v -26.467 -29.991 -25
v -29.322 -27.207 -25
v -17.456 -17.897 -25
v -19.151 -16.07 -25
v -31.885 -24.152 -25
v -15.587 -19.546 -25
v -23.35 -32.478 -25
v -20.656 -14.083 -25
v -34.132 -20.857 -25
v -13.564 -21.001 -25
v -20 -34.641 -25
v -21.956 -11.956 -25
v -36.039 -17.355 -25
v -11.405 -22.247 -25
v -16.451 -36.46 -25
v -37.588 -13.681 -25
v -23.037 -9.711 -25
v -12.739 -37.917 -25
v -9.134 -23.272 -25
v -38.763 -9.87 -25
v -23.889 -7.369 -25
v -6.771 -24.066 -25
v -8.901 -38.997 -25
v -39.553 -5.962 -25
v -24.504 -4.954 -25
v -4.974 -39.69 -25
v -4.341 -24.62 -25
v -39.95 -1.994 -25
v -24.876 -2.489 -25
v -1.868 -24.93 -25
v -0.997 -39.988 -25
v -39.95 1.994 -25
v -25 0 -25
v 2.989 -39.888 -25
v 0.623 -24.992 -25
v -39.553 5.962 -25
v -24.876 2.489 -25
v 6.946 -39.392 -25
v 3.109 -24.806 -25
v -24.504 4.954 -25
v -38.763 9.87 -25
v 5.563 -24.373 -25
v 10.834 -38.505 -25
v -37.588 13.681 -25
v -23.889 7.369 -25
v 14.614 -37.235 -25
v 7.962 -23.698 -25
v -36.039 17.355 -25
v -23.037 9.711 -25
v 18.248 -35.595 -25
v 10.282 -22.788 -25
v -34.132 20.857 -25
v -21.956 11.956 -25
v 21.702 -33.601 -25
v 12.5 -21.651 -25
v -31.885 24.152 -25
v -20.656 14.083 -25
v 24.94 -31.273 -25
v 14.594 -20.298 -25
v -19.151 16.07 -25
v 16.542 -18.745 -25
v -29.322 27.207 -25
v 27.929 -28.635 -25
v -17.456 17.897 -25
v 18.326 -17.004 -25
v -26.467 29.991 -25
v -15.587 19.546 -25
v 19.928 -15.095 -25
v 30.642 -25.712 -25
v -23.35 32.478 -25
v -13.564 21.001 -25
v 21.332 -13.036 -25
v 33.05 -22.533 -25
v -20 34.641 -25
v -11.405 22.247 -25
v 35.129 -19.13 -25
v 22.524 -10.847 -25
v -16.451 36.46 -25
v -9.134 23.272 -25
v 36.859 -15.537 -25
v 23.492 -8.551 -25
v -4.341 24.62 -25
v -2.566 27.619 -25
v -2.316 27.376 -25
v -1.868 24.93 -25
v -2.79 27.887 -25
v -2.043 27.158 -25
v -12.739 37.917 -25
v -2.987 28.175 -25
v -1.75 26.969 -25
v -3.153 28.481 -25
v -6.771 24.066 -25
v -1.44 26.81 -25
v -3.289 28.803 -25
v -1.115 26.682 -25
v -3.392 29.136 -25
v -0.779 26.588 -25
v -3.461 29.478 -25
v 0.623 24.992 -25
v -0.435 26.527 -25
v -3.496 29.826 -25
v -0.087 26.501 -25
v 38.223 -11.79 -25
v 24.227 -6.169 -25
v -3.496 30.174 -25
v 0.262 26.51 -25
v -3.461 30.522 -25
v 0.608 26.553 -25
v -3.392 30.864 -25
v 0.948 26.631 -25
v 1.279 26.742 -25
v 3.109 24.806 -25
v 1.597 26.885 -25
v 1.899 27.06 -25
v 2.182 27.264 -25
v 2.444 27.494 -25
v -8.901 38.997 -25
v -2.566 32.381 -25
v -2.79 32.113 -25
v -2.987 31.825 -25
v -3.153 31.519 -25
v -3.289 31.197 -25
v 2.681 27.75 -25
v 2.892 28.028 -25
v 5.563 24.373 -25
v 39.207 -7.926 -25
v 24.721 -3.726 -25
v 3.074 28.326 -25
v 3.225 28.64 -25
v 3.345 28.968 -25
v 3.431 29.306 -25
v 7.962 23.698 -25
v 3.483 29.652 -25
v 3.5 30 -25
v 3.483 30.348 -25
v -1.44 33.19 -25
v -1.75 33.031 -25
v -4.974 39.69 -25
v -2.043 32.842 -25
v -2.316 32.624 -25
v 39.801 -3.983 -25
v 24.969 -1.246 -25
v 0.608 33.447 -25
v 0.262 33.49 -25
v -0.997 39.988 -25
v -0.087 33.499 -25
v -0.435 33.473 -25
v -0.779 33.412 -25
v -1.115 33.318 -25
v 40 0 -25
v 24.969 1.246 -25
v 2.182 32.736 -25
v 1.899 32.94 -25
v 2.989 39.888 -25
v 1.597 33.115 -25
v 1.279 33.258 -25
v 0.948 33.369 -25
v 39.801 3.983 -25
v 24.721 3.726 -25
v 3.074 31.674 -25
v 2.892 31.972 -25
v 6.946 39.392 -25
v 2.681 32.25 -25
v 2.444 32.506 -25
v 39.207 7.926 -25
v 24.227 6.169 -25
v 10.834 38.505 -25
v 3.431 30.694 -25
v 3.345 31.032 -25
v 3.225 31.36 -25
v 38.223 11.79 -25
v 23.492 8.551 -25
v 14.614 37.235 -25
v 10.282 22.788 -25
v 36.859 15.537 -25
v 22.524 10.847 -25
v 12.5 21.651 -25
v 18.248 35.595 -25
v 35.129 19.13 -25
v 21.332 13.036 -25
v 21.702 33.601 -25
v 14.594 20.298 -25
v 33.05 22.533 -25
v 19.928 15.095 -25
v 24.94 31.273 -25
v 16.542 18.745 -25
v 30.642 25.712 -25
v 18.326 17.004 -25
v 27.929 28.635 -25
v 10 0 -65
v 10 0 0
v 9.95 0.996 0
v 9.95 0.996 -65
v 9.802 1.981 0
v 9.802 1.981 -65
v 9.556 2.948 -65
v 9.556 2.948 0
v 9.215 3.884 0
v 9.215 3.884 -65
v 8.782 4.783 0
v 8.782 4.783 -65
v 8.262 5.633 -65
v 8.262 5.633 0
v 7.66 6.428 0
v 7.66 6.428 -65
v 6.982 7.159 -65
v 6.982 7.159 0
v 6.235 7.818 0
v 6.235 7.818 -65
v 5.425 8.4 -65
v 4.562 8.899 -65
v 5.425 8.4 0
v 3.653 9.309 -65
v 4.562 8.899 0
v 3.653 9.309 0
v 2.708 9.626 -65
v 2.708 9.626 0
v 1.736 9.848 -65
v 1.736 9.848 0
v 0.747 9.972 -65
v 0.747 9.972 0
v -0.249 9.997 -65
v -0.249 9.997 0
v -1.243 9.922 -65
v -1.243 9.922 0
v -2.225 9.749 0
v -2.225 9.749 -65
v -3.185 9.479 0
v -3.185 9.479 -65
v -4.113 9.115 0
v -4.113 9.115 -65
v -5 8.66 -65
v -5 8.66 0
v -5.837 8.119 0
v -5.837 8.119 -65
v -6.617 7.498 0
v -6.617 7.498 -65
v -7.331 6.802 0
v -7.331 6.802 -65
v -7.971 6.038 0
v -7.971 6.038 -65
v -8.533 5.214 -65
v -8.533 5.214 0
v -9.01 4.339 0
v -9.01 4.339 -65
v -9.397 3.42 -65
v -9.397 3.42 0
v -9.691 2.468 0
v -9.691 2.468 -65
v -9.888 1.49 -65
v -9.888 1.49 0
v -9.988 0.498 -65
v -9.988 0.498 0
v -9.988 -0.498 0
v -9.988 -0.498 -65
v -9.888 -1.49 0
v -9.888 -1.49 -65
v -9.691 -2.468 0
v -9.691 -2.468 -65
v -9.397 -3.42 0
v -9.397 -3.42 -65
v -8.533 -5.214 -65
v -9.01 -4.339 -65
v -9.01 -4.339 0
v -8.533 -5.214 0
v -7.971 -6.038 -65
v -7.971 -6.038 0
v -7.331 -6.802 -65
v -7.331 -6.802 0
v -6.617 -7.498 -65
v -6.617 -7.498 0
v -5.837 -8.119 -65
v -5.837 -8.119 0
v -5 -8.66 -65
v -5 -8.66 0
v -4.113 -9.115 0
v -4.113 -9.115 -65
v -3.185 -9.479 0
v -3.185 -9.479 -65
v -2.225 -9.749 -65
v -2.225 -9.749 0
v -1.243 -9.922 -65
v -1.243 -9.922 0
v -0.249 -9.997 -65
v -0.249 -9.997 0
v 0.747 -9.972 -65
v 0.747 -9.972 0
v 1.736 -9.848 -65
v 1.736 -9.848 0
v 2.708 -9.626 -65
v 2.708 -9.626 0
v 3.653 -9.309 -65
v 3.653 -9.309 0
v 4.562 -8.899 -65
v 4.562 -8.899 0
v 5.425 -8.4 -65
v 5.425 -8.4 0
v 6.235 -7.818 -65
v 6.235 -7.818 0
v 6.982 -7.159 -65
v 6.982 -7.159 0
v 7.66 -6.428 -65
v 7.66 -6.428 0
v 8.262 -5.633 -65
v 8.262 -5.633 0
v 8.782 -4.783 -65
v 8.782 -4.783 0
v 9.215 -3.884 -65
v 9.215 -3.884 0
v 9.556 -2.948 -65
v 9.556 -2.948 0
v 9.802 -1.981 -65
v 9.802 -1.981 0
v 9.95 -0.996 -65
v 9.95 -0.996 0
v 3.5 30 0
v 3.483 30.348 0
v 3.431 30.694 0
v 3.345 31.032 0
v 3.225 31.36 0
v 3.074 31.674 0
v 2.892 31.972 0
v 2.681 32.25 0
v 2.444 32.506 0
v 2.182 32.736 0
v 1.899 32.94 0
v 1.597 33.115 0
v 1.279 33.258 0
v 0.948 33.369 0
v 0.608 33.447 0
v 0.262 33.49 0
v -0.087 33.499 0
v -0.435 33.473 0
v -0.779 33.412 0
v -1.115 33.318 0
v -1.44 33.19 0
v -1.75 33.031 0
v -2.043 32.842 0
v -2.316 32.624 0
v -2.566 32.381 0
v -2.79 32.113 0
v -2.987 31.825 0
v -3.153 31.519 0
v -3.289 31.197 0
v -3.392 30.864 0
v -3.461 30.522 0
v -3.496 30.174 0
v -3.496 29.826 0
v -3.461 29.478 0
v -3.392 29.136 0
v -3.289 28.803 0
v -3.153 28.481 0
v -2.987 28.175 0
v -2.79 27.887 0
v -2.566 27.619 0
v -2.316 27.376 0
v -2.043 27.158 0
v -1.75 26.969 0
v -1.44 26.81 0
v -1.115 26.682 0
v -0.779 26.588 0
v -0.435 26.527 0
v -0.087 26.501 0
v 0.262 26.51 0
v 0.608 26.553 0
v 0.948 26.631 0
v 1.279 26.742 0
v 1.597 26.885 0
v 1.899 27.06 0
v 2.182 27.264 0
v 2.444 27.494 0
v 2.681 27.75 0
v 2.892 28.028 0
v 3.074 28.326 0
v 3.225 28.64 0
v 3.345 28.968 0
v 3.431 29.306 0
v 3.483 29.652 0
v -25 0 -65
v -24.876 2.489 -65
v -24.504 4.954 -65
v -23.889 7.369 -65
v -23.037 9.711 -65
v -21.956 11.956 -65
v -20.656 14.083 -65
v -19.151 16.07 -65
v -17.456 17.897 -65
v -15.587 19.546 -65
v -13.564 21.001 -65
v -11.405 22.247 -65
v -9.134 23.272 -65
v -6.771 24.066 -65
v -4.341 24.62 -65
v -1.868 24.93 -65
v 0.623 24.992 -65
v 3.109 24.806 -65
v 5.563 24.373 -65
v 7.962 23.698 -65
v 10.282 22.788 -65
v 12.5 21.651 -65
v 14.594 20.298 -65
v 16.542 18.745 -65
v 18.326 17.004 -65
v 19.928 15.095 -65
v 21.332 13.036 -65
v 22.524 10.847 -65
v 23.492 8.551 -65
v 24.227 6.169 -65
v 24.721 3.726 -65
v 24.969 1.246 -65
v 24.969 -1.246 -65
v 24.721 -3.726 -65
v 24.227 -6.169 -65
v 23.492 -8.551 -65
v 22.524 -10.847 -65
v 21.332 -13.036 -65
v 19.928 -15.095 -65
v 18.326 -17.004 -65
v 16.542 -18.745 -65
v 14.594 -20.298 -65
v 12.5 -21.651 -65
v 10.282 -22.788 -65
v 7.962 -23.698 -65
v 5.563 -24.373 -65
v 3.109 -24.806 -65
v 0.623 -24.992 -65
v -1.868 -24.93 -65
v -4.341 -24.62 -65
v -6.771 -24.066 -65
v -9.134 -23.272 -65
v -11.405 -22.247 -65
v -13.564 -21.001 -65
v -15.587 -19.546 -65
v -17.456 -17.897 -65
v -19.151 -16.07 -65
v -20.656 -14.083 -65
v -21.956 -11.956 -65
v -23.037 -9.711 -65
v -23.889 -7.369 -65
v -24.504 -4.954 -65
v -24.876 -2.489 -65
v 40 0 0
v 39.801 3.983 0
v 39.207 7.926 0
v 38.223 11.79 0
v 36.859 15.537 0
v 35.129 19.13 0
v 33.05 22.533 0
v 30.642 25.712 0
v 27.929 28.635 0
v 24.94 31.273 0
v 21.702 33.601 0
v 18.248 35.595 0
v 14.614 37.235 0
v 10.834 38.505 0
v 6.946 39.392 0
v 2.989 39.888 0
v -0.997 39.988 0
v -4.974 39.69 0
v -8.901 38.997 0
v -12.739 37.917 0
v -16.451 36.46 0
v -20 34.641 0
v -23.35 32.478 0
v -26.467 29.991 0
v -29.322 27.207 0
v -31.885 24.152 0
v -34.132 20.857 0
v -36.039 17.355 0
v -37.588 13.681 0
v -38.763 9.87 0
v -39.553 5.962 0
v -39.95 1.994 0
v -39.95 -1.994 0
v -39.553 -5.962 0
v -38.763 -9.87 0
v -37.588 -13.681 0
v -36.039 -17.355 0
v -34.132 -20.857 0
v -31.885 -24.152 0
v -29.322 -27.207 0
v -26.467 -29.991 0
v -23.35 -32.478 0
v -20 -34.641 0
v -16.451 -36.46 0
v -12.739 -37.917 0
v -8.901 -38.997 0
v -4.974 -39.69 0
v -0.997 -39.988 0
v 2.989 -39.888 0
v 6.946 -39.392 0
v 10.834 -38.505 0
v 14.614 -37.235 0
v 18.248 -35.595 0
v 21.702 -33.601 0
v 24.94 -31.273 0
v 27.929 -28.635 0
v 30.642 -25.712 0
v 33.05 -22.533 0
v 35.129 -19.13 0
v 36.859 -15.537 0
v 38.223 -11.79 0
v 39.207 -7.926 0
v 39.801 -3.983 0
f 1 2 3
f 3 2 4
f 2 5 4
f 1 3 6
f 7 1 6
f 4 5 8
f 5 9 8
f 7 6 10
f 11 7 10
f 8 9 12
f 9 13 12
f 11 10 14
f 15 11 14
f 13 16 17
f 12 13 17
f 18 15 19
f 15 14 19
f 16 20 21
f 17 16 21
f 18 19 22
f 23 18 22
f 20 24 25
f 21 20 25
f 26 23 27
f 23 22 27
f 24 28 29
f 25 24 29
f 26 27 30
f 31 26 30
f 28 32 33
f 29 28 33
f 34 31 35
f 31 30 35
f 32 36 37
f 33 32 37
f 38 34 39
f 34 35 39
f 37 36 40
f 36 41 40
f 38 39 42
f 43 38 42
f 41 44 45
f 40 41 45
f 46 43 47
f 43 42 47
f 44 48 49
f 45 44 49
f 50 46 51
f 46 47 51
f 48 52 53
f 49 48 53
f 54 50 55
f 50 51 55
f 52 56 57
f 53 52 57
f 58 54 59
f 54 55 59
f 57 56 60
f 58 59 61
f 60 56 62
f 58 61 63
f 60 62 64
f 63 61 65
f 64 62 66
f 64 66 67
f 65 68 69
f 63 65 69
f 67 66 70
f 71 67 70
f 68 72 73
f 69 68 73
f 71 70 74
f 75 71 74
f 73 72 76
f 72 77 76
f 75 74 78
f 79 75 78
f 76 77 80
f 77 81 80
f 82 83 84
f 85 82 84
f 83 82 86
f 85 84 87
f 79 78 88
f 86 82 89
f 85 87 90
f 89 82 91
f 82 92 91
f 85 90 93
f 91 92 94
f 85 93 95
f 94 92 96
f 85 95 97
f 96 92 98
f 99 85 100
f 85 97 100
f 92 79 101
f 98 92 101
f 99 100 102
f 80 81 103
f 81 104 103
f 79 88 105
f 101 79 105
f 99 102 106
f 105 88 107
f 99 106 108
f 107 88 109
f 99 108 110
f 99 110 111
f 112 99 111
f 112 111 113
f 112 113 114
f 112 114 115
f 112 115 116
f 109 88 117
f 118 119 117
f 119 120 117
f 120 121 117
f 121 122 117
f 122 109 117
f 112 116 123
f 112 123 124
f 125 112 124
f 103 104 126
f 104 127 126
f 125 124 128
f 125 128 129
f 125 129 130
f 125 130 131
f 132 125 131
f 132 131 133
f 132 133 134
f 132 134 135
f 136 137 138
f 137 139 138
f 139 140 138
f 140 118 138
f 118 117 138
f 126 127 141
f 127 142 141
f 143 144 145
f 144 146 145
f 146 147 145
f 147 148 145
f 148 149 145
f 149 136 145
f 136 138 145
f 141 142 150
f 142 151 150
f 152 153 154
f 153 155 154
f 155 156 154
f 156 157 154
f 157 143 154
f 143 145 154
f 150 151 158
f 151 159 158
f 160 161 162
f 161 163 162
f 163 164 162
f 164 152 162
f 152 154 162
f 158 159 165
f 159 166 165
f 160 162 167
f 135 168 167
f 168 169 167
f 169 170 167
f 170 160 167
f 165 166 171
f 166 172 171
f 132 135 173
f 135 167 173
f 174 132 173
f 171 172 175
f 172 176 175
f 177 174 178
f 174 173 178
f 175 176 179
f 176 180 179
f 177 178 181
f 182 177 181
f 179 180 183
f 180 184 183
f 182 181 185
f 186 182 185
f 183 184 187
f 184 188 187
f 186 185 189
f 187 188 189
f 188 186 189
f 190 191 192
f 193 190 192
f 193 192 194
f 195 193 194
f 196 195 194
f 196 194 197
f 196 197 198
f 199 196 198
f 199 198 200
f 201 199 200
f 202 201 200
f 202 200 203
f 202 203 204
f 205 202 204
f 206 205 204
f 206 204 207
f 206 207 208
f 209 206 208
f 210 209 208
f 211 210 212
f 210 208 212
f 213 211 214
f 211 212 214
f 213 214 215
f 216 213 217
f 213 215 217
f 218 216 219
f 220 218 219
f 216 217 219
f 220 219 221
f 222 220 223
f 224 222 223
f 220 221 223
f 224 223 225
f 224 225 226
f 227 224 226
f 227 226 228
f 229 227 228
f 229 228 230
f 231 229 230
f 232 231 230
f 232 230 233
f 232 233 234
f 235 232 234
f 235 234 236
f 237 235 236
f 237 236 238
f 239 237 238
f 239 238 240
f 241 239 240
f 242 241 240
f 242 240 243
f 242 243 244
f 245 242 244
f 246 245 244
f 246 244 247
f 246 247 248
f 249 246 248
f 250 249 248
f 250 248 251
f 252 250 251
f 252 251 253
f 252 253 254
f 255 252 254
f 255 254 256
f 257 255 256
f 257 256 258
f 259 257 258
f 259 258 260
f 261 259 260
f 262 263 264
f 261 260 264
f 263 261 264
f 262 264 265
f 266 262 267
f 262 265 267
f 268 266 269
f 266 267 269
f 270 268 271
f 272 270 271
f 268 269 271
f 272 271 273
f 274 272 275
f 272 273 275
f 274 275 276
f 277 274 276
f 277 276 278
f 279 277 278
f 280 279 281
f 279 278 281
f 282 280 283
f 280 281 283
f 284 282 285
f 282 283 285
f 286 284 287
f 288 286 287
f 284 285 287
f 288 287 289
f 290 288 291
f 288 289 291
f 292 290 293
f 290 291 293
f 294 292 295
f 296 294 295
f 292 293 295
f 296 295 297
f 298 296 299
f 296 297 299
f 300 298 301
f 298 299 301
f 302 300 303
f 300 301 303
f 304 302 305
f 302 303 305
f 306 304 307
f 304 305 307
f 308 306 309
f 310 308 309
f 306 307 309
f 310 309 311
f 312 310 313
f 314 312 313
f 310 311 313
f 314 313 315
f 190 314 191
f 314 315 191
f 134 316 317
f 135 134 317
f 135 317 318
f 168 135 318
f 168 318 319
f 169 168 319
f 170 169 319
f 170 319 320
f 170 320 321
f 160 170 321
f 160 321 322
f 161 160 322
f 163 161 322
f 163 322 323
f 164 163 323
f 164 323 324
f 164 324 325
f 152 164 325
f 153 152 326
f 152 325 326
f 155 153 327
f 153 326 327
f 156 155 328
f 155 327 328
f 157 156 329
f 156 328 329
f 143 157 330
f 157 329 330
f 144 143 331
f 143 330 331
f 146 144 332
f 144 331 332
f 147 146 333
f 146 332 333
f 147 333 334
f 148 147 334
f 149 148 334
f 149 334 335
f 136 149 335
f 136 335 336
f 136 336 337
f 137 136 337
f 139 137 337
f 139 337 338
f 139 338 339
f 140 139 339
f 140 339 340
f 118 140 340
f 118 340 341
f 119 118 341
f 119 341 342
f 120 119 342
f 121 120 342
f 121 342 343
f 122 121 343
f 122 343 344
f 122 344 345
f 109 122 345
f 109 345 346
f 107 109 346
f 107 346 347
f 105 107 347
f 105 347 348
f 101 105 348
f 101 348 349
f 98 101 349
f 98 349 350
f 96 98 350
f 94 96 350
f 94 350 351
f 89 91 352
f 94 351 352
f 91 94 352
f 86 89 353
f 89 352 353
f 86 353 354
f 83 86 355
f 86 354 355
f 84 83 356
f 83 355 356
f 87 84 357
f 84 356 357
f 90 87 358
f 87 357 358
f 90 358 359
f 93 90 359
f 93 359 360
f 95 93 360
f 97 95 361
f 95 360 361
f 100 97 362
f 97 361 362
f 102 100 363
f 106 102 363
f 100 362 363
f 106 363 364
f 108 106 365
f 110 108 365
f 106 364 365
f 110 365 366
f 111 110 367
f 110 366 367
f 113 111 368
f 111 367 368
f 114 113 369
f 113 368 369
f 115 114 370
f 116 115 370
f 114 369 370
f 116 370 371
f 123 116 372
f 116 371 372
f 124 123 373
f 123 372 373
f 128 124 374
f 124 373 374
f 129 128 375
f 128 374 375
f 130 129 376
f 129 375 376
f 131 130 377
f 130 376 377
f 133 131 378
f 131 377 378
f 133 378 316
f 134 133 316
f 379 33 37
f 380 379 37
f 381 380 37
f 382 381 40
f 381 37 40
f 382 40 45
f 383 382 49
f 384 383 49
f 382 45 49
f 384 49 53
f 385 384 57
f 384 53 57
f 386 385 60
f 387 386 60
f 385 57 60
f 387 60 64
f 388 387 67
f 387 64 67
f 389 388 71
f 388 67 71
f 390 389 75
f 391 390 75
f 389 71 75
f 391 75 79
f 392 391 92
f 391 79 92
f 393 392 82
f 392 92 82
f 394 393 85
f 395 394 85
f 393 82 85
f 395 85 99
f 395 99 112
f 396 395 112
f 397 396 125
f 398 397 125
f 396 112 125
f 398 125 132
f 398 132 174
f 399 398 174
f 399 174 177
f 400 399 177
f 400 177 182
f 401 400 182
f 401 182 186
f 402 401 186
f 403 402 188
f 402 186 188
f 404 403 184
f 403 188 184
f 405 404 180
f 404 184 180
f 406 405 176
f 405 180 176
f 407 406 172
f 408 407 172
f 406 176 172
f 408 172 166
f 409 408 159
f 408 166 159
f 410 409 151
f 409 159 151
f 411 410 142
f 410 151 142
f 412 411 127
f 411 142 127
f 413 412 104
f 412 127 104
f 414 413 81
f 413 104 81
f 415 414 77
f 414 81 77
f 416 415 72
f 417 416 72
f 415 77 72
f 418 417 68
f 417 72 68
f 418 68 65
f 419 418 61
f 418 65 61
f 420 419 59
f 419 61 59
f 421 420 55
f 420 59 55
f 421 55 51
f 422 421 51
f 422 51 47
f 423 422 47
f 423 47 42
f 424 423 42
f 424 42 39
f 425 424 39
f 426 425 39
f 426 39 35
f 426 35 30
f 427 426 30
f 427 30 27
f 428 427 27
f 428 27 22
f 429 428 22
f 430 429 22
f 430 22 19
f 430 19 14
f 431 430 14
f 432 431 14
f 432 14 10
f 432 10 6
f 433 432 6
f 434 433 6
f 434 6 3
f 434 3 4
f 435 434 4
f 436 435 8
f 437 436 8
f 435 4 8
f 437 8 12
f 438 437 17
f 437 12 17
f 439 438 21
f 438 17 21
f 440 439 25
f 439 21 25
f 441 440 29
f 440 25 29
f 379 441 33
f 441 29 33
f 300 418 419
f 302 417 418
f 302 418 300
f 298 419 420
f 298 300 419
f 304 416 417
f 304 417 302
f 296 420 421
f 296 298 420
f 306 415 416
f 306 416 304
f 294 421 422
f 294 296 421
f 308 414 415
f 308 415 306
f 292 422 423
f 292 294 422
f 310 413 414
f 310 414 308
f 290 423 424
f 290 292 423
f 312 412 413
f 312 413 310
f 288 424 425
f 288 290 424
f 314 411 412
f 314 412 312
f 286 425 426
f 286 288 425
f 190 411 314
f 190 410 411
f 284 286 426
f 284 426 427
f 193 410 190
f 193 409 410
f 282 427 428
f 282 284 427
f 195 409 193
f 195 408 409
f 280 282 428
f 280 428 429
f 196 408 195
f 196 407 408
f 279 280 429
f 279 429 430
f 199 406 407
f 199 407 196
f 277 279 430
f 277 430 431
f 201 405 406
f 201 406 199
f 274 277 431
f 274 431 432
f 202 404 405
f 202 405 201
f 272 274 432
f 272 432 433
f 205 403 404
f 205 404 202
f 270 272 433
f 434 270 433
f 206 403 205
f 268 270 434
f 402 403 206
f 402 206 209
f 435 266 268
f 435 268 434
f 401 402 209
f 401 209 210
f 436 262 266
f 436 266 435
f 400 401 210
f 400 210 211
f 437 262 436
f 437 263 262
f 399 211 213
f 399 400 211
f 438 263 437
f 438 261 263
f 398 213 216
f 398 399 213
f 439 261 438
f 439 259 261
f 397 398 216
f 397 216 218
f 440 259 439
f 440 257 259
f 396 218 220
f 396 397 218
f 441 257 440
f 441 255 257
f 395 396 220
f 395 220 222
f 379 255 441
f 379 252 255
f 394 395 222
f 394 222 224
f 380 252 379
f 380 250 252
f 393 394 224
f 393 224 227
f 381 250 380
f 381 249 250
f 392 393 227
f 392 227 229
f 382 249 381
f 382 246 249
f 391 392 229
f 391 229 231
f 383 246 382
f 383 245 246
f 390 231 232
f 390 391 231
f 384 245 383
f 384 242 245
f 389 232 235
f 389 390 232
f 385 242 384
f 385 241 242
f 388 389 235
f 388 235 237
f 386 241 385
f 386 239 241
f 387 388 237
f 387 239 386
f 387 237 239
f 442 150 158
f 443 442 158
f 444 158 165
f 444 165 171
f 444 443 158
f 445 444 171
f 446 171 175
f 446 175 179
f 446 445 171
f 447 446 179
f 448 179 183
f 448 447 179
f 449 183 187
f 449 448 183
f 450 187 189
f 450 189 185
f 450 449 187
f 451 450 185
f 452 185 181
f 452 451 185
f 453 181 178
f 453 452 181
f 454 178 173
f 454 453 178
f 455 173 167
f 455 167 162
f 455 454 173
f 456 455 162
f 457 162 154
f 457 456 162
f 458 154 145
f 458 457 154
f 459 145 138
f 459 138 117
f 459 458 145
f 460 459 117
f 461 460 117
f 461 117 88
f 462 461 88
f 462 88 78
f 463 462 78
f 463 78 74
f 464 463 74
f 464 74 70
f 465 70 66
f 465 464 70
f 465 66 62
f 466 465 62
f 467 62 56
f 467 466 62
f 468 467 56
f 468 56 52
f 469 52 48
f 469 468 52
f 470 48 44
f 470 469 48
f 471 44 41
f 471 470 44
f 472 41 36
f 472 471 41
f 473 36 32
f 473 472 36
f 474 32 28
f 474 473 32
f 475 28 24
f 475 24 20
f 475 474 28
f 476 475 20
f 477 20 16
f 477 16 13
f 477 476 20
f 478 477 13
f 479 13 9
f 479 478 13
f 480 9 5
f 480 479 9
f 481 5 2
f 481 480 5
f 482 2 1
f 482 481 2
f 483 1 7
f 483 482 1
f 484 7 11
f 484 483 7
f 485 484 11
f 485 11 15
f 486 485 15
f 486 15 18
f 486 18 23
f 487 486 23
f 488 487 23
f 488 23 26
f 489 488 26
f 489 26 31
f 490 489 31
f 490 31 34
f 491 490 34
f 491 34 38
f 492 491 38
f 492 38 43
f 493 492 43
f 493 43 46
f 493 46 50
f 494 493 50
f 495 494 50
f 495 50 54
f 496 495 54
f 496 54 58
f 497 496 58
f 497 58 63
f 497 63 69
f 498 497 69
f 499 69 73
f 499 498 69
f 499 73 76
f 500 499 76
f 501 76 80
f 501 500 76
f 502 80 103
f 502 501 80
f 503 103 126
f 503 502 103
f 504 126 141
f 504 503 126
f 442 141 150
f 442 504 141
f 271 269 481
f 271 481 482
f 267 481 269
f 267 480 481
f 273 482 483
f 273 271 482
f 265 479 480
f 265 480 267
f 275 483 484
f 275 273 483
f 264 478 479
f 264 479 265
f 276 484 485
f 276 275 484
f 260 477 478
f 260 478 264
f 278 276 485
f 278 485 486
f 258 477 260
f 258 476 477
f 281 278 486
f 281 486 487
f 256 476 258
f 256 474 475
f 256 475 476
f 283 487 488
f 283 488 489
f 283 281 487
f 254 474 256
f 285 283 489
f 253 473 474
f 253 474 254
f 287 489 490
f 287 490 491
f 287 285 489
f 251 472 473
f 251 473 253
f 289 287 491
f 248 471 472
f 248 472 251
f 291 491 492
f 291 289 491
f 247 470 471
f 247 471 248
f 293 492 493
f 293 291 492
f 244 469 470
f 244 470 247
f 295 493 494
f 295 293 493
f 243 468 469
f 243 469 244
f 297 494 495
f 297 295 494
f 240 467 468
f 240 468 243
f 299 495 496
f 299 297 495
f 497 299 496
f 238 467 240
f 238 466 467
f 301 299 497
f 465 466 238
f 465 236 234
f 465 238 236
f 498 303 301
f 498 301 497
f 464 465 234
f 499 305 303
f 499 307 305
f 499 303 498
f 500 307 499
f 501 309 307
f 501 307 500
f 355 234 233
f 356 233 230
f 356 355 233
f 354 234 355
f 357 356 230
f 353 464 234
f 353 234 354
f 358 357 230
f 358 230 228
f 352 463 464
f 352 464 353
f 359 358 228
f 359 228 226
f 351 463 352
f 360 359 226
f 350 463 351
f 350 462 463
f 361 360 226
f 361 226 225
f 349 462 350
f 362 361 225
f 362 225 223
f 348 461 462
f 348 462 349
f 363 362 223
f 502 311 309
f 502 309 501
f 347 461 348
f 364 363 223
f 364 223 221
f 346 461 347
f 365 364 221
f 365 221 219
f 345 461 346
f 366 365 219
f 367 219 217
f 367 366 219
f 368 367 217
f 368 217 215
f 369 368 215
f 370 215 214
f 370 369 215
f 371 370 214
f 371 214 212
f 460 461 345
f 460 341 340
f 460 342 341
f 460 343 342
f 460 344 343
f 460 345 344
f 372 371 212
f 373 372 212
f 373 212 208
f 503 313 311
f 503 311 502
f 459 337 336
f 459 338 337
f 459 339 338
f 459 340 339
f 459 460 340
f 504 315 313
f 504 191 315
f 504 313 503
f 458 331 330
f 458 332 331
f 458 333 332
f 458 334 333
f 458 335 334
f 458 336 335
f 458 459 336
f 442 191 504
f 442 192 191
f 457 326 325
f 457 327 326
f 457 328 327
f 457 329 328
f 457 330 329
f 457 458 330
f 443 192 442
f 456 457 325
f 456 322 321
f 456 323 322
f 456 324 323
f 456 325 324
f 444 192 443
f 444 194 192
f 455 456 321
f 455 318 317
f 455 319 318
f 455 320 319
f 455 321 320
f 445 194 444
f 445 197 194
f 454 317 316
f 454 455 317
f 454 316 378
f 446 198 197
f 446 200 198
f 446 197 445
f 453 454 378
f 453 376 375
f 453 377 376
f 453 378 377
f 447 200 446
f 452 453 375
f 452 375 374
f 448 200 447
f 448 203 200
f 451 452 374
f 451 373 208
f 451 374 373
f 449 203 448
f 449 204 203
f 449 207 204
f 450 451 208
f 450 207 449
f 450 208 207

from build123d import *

# Parameters (mm, degrees)
SKETCH2_R           = 40
BOSS_EXTRUDE1_DEPTH = 25
SKETCH3_R           = 25
BOSS_EXTRUDE2_DEPTH = 40
SKETCH4_R           = 10
CUT_EXTRUDE1_DEPTH  = 87.168439698
SKETCH5_R           = 3.5
CUT_EXTRUDE2_DEPTH  = 87.168439698


with BuildPart() as part:
    # Sketch2 → Boss-Extrude1 (new body)
    with BuildSketch(Plane.XY):
        Circle(SKETCH2_R)
    extrude(amount=-BOSS_EXTRUDE1_DEPTH)

    # Sketch3 → Boss-Extrude2 (add)
    with BuildSketch(Plane(origin=(0, 0, -25), x_dir=(-1, 0, 0), z_dir=(0, 0, -1))):
        Circle(SKETCH3_R)
    extrude(amount=BOSS_EXTRUDE2_DEPTH)

    # Sketch4 → Cut-Extrude1 (cut, through all)
    with BuildSketch(Plane.XY):
        Circle(SKETCH4_R)
    extrude(amount=-CUT_EXTRUDE1_DEPTH, mode=Mode.SUBTRACT)

    # Sketch5 → Cut-Extrude2 (cut, through all)
    with BuildSketch(Plane.XY):
        with Locations((0, 30)):
            Circle(SKETCH5_R)
    extrude(amount=-CUT_EXTRUDE2_DEPTH, mode=Mode.SUBTRACT)


solid = part.part
